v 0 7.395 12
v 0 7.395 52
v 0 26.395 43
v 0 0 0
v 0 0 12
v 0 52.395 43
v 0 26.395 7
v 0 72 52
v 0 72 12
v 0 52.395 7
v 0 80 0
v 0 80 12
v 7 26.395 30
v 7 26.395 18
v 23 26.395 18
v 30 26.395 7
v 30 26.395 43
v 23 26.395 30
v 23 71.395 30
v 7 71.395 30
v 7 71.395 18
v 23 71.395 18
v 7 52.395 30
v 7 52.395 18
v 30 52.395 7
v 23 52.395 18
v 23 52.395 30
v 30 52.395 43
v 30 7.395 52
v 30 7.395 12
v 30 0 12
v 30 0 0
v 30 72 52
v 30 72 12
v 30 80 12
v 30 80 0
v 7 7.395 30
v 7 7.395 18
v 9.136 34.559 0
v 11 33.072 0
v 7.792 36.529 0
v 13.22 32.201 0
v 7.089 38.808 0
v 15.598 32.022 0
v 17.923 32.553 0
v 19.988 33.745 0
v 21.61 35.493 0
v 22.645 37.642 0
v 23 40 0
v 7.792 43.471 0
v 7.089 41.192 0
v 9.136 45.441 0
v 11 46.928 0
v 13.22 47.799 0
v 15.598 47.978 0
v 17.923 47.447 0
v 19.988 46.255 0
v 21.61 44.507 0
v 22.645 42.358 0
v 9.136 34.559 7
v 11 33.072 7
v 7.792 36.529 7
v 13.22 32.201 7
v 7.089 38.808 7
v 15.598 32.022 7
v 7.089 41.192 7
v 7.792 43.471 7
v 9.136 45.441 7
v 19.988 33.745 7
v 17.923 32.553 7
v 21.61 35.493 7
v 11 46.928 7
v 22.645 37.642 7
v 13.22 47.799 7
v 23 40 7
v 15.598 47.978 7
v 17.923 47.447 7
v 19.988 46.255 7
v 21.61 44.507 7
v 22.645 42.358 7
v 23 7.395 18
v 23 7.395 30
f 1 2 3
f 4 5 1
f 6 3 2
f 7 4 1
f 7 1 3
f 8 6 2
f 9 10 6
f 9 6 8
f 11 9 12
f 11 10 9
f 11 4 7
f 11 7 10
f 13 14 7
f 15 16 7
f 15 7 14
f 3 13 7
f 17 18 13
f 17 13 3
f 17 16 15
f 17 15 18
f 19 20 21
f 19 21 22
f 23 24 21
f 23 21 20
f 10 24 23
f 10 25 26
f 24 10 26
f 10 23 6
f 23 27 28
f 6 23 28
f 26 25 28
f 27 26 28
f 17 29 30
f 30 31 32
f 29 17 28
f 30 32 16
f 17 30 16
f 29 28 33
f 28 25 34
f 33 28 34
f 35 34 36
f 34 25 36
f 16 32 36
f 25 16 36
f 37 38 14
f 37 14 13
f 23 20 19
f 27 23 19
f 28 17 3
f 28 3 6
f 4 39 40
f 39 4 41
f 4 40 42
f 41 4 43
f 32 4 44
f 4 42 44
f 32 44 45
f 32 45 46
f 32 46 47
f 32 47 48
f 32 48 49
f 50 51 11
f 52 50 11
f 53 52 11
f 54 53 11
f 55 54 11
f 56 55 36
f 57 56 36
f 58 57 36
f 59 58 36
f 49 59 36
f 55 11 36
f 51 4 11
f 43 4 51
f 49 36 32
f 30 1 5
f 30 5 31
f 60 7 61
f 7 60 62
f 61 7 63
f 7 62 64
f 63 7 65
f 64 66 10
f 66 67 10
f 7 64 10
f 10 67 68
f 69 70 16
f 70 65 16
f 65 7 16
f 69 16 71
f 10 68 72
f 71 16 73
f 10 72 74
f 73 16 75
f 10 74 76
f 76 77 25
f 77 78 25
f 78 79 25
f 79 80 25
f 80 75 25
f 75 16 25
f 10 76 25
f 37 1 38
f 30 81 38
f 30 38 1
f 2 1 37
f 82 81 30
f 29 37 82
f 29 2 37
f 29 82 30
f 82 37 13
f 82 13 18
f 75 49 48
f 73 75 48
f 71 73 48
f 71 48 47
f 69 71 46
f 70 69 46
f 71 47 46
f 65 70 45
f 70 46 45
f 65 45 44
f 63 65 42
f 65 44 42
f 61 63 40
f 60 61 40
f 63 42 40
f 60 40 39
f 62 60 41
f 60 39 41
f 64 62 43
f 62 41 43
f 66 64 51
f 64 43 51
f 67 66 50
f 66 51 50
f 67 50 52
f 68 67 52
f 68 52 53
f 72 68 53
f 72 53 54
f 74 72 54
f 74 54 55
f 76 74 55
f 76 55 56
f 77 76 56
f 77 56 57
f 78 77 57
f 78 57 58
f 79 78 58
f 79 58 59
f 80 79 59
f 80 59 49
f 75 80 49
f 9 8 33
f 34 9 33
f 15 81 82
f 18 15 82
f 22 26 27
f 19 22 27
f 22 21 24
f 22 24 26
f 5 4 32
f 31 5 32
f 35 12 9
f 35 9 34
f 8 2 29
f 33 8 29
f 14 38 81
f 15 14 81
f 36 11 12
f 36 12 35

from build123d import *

# Parameters (mm, degrees)
F0_W     = 30
F0_H     = 80
F1_DEPTH = 52
F2_W     = 30
F2_H     = 8
F2_H_2   = 7.3947347701
F3_DEPTH = 40
F4_W     = 16
F4_H     = 12
F5_DEPTH = 64
F6_W     = 26
F6_H     = 36
F7_DEPTH = 30
F8_R     = 8
F9_DEPTH = 9


with BuildPart() as f1:
    # F0 (on Top) → F1 (new body)
    with BuildSketch(Plane.XY):
        with Locations((15, 40)):
            Rectangle(F0_W, F0_H)
    extrude(amount=F1_DEPTH)

    # F2 (on face) → F3 (cut)
    with BuildSketch(Plane.XY.offset(52)):
        with Locations((15, 76)):
            Rectangle(F2_W, F2_H)
        with Locations((15, 3.697367385)):
            Rectangle(F2_W, F2_H_2)
    extrude(amount=-F3_DEPTH, mode=Mode.SUBTRACT)

    # F4 (on face) → F5 (cut)
    with BuildSketch(Plane.XZ.offset(-7.3947347701)):
        with Locations((15, 24)):
            Rectangle(F4_W, F4_H)
    extrude(amount=-F5_DEPTH, mode=Mode.SUBTRACT)

    # F6 (on face) → F7 (cut)
    with BuildSketch(Plane.YZ.offset(30)):
        with Locations((39.3947347701, 25)):
            Rectangle(F6_W, F6_H)
    extrude(amount=-F7_DEPTH, mode=Mode.SUBTRACT)

    # F8 (on face) → F9 (cut)
    with BuildSketch(Plane(origin=(0, 0, 0), x_dir=(1, 0, 0), z_dir=(0, 0, -1))):
        with Locations((15, -40)):
            Circle(F8_R)
    extrude(amount=-F9_DEPTH, mode=Mode.SUBTRACT)


solid = f1.part
